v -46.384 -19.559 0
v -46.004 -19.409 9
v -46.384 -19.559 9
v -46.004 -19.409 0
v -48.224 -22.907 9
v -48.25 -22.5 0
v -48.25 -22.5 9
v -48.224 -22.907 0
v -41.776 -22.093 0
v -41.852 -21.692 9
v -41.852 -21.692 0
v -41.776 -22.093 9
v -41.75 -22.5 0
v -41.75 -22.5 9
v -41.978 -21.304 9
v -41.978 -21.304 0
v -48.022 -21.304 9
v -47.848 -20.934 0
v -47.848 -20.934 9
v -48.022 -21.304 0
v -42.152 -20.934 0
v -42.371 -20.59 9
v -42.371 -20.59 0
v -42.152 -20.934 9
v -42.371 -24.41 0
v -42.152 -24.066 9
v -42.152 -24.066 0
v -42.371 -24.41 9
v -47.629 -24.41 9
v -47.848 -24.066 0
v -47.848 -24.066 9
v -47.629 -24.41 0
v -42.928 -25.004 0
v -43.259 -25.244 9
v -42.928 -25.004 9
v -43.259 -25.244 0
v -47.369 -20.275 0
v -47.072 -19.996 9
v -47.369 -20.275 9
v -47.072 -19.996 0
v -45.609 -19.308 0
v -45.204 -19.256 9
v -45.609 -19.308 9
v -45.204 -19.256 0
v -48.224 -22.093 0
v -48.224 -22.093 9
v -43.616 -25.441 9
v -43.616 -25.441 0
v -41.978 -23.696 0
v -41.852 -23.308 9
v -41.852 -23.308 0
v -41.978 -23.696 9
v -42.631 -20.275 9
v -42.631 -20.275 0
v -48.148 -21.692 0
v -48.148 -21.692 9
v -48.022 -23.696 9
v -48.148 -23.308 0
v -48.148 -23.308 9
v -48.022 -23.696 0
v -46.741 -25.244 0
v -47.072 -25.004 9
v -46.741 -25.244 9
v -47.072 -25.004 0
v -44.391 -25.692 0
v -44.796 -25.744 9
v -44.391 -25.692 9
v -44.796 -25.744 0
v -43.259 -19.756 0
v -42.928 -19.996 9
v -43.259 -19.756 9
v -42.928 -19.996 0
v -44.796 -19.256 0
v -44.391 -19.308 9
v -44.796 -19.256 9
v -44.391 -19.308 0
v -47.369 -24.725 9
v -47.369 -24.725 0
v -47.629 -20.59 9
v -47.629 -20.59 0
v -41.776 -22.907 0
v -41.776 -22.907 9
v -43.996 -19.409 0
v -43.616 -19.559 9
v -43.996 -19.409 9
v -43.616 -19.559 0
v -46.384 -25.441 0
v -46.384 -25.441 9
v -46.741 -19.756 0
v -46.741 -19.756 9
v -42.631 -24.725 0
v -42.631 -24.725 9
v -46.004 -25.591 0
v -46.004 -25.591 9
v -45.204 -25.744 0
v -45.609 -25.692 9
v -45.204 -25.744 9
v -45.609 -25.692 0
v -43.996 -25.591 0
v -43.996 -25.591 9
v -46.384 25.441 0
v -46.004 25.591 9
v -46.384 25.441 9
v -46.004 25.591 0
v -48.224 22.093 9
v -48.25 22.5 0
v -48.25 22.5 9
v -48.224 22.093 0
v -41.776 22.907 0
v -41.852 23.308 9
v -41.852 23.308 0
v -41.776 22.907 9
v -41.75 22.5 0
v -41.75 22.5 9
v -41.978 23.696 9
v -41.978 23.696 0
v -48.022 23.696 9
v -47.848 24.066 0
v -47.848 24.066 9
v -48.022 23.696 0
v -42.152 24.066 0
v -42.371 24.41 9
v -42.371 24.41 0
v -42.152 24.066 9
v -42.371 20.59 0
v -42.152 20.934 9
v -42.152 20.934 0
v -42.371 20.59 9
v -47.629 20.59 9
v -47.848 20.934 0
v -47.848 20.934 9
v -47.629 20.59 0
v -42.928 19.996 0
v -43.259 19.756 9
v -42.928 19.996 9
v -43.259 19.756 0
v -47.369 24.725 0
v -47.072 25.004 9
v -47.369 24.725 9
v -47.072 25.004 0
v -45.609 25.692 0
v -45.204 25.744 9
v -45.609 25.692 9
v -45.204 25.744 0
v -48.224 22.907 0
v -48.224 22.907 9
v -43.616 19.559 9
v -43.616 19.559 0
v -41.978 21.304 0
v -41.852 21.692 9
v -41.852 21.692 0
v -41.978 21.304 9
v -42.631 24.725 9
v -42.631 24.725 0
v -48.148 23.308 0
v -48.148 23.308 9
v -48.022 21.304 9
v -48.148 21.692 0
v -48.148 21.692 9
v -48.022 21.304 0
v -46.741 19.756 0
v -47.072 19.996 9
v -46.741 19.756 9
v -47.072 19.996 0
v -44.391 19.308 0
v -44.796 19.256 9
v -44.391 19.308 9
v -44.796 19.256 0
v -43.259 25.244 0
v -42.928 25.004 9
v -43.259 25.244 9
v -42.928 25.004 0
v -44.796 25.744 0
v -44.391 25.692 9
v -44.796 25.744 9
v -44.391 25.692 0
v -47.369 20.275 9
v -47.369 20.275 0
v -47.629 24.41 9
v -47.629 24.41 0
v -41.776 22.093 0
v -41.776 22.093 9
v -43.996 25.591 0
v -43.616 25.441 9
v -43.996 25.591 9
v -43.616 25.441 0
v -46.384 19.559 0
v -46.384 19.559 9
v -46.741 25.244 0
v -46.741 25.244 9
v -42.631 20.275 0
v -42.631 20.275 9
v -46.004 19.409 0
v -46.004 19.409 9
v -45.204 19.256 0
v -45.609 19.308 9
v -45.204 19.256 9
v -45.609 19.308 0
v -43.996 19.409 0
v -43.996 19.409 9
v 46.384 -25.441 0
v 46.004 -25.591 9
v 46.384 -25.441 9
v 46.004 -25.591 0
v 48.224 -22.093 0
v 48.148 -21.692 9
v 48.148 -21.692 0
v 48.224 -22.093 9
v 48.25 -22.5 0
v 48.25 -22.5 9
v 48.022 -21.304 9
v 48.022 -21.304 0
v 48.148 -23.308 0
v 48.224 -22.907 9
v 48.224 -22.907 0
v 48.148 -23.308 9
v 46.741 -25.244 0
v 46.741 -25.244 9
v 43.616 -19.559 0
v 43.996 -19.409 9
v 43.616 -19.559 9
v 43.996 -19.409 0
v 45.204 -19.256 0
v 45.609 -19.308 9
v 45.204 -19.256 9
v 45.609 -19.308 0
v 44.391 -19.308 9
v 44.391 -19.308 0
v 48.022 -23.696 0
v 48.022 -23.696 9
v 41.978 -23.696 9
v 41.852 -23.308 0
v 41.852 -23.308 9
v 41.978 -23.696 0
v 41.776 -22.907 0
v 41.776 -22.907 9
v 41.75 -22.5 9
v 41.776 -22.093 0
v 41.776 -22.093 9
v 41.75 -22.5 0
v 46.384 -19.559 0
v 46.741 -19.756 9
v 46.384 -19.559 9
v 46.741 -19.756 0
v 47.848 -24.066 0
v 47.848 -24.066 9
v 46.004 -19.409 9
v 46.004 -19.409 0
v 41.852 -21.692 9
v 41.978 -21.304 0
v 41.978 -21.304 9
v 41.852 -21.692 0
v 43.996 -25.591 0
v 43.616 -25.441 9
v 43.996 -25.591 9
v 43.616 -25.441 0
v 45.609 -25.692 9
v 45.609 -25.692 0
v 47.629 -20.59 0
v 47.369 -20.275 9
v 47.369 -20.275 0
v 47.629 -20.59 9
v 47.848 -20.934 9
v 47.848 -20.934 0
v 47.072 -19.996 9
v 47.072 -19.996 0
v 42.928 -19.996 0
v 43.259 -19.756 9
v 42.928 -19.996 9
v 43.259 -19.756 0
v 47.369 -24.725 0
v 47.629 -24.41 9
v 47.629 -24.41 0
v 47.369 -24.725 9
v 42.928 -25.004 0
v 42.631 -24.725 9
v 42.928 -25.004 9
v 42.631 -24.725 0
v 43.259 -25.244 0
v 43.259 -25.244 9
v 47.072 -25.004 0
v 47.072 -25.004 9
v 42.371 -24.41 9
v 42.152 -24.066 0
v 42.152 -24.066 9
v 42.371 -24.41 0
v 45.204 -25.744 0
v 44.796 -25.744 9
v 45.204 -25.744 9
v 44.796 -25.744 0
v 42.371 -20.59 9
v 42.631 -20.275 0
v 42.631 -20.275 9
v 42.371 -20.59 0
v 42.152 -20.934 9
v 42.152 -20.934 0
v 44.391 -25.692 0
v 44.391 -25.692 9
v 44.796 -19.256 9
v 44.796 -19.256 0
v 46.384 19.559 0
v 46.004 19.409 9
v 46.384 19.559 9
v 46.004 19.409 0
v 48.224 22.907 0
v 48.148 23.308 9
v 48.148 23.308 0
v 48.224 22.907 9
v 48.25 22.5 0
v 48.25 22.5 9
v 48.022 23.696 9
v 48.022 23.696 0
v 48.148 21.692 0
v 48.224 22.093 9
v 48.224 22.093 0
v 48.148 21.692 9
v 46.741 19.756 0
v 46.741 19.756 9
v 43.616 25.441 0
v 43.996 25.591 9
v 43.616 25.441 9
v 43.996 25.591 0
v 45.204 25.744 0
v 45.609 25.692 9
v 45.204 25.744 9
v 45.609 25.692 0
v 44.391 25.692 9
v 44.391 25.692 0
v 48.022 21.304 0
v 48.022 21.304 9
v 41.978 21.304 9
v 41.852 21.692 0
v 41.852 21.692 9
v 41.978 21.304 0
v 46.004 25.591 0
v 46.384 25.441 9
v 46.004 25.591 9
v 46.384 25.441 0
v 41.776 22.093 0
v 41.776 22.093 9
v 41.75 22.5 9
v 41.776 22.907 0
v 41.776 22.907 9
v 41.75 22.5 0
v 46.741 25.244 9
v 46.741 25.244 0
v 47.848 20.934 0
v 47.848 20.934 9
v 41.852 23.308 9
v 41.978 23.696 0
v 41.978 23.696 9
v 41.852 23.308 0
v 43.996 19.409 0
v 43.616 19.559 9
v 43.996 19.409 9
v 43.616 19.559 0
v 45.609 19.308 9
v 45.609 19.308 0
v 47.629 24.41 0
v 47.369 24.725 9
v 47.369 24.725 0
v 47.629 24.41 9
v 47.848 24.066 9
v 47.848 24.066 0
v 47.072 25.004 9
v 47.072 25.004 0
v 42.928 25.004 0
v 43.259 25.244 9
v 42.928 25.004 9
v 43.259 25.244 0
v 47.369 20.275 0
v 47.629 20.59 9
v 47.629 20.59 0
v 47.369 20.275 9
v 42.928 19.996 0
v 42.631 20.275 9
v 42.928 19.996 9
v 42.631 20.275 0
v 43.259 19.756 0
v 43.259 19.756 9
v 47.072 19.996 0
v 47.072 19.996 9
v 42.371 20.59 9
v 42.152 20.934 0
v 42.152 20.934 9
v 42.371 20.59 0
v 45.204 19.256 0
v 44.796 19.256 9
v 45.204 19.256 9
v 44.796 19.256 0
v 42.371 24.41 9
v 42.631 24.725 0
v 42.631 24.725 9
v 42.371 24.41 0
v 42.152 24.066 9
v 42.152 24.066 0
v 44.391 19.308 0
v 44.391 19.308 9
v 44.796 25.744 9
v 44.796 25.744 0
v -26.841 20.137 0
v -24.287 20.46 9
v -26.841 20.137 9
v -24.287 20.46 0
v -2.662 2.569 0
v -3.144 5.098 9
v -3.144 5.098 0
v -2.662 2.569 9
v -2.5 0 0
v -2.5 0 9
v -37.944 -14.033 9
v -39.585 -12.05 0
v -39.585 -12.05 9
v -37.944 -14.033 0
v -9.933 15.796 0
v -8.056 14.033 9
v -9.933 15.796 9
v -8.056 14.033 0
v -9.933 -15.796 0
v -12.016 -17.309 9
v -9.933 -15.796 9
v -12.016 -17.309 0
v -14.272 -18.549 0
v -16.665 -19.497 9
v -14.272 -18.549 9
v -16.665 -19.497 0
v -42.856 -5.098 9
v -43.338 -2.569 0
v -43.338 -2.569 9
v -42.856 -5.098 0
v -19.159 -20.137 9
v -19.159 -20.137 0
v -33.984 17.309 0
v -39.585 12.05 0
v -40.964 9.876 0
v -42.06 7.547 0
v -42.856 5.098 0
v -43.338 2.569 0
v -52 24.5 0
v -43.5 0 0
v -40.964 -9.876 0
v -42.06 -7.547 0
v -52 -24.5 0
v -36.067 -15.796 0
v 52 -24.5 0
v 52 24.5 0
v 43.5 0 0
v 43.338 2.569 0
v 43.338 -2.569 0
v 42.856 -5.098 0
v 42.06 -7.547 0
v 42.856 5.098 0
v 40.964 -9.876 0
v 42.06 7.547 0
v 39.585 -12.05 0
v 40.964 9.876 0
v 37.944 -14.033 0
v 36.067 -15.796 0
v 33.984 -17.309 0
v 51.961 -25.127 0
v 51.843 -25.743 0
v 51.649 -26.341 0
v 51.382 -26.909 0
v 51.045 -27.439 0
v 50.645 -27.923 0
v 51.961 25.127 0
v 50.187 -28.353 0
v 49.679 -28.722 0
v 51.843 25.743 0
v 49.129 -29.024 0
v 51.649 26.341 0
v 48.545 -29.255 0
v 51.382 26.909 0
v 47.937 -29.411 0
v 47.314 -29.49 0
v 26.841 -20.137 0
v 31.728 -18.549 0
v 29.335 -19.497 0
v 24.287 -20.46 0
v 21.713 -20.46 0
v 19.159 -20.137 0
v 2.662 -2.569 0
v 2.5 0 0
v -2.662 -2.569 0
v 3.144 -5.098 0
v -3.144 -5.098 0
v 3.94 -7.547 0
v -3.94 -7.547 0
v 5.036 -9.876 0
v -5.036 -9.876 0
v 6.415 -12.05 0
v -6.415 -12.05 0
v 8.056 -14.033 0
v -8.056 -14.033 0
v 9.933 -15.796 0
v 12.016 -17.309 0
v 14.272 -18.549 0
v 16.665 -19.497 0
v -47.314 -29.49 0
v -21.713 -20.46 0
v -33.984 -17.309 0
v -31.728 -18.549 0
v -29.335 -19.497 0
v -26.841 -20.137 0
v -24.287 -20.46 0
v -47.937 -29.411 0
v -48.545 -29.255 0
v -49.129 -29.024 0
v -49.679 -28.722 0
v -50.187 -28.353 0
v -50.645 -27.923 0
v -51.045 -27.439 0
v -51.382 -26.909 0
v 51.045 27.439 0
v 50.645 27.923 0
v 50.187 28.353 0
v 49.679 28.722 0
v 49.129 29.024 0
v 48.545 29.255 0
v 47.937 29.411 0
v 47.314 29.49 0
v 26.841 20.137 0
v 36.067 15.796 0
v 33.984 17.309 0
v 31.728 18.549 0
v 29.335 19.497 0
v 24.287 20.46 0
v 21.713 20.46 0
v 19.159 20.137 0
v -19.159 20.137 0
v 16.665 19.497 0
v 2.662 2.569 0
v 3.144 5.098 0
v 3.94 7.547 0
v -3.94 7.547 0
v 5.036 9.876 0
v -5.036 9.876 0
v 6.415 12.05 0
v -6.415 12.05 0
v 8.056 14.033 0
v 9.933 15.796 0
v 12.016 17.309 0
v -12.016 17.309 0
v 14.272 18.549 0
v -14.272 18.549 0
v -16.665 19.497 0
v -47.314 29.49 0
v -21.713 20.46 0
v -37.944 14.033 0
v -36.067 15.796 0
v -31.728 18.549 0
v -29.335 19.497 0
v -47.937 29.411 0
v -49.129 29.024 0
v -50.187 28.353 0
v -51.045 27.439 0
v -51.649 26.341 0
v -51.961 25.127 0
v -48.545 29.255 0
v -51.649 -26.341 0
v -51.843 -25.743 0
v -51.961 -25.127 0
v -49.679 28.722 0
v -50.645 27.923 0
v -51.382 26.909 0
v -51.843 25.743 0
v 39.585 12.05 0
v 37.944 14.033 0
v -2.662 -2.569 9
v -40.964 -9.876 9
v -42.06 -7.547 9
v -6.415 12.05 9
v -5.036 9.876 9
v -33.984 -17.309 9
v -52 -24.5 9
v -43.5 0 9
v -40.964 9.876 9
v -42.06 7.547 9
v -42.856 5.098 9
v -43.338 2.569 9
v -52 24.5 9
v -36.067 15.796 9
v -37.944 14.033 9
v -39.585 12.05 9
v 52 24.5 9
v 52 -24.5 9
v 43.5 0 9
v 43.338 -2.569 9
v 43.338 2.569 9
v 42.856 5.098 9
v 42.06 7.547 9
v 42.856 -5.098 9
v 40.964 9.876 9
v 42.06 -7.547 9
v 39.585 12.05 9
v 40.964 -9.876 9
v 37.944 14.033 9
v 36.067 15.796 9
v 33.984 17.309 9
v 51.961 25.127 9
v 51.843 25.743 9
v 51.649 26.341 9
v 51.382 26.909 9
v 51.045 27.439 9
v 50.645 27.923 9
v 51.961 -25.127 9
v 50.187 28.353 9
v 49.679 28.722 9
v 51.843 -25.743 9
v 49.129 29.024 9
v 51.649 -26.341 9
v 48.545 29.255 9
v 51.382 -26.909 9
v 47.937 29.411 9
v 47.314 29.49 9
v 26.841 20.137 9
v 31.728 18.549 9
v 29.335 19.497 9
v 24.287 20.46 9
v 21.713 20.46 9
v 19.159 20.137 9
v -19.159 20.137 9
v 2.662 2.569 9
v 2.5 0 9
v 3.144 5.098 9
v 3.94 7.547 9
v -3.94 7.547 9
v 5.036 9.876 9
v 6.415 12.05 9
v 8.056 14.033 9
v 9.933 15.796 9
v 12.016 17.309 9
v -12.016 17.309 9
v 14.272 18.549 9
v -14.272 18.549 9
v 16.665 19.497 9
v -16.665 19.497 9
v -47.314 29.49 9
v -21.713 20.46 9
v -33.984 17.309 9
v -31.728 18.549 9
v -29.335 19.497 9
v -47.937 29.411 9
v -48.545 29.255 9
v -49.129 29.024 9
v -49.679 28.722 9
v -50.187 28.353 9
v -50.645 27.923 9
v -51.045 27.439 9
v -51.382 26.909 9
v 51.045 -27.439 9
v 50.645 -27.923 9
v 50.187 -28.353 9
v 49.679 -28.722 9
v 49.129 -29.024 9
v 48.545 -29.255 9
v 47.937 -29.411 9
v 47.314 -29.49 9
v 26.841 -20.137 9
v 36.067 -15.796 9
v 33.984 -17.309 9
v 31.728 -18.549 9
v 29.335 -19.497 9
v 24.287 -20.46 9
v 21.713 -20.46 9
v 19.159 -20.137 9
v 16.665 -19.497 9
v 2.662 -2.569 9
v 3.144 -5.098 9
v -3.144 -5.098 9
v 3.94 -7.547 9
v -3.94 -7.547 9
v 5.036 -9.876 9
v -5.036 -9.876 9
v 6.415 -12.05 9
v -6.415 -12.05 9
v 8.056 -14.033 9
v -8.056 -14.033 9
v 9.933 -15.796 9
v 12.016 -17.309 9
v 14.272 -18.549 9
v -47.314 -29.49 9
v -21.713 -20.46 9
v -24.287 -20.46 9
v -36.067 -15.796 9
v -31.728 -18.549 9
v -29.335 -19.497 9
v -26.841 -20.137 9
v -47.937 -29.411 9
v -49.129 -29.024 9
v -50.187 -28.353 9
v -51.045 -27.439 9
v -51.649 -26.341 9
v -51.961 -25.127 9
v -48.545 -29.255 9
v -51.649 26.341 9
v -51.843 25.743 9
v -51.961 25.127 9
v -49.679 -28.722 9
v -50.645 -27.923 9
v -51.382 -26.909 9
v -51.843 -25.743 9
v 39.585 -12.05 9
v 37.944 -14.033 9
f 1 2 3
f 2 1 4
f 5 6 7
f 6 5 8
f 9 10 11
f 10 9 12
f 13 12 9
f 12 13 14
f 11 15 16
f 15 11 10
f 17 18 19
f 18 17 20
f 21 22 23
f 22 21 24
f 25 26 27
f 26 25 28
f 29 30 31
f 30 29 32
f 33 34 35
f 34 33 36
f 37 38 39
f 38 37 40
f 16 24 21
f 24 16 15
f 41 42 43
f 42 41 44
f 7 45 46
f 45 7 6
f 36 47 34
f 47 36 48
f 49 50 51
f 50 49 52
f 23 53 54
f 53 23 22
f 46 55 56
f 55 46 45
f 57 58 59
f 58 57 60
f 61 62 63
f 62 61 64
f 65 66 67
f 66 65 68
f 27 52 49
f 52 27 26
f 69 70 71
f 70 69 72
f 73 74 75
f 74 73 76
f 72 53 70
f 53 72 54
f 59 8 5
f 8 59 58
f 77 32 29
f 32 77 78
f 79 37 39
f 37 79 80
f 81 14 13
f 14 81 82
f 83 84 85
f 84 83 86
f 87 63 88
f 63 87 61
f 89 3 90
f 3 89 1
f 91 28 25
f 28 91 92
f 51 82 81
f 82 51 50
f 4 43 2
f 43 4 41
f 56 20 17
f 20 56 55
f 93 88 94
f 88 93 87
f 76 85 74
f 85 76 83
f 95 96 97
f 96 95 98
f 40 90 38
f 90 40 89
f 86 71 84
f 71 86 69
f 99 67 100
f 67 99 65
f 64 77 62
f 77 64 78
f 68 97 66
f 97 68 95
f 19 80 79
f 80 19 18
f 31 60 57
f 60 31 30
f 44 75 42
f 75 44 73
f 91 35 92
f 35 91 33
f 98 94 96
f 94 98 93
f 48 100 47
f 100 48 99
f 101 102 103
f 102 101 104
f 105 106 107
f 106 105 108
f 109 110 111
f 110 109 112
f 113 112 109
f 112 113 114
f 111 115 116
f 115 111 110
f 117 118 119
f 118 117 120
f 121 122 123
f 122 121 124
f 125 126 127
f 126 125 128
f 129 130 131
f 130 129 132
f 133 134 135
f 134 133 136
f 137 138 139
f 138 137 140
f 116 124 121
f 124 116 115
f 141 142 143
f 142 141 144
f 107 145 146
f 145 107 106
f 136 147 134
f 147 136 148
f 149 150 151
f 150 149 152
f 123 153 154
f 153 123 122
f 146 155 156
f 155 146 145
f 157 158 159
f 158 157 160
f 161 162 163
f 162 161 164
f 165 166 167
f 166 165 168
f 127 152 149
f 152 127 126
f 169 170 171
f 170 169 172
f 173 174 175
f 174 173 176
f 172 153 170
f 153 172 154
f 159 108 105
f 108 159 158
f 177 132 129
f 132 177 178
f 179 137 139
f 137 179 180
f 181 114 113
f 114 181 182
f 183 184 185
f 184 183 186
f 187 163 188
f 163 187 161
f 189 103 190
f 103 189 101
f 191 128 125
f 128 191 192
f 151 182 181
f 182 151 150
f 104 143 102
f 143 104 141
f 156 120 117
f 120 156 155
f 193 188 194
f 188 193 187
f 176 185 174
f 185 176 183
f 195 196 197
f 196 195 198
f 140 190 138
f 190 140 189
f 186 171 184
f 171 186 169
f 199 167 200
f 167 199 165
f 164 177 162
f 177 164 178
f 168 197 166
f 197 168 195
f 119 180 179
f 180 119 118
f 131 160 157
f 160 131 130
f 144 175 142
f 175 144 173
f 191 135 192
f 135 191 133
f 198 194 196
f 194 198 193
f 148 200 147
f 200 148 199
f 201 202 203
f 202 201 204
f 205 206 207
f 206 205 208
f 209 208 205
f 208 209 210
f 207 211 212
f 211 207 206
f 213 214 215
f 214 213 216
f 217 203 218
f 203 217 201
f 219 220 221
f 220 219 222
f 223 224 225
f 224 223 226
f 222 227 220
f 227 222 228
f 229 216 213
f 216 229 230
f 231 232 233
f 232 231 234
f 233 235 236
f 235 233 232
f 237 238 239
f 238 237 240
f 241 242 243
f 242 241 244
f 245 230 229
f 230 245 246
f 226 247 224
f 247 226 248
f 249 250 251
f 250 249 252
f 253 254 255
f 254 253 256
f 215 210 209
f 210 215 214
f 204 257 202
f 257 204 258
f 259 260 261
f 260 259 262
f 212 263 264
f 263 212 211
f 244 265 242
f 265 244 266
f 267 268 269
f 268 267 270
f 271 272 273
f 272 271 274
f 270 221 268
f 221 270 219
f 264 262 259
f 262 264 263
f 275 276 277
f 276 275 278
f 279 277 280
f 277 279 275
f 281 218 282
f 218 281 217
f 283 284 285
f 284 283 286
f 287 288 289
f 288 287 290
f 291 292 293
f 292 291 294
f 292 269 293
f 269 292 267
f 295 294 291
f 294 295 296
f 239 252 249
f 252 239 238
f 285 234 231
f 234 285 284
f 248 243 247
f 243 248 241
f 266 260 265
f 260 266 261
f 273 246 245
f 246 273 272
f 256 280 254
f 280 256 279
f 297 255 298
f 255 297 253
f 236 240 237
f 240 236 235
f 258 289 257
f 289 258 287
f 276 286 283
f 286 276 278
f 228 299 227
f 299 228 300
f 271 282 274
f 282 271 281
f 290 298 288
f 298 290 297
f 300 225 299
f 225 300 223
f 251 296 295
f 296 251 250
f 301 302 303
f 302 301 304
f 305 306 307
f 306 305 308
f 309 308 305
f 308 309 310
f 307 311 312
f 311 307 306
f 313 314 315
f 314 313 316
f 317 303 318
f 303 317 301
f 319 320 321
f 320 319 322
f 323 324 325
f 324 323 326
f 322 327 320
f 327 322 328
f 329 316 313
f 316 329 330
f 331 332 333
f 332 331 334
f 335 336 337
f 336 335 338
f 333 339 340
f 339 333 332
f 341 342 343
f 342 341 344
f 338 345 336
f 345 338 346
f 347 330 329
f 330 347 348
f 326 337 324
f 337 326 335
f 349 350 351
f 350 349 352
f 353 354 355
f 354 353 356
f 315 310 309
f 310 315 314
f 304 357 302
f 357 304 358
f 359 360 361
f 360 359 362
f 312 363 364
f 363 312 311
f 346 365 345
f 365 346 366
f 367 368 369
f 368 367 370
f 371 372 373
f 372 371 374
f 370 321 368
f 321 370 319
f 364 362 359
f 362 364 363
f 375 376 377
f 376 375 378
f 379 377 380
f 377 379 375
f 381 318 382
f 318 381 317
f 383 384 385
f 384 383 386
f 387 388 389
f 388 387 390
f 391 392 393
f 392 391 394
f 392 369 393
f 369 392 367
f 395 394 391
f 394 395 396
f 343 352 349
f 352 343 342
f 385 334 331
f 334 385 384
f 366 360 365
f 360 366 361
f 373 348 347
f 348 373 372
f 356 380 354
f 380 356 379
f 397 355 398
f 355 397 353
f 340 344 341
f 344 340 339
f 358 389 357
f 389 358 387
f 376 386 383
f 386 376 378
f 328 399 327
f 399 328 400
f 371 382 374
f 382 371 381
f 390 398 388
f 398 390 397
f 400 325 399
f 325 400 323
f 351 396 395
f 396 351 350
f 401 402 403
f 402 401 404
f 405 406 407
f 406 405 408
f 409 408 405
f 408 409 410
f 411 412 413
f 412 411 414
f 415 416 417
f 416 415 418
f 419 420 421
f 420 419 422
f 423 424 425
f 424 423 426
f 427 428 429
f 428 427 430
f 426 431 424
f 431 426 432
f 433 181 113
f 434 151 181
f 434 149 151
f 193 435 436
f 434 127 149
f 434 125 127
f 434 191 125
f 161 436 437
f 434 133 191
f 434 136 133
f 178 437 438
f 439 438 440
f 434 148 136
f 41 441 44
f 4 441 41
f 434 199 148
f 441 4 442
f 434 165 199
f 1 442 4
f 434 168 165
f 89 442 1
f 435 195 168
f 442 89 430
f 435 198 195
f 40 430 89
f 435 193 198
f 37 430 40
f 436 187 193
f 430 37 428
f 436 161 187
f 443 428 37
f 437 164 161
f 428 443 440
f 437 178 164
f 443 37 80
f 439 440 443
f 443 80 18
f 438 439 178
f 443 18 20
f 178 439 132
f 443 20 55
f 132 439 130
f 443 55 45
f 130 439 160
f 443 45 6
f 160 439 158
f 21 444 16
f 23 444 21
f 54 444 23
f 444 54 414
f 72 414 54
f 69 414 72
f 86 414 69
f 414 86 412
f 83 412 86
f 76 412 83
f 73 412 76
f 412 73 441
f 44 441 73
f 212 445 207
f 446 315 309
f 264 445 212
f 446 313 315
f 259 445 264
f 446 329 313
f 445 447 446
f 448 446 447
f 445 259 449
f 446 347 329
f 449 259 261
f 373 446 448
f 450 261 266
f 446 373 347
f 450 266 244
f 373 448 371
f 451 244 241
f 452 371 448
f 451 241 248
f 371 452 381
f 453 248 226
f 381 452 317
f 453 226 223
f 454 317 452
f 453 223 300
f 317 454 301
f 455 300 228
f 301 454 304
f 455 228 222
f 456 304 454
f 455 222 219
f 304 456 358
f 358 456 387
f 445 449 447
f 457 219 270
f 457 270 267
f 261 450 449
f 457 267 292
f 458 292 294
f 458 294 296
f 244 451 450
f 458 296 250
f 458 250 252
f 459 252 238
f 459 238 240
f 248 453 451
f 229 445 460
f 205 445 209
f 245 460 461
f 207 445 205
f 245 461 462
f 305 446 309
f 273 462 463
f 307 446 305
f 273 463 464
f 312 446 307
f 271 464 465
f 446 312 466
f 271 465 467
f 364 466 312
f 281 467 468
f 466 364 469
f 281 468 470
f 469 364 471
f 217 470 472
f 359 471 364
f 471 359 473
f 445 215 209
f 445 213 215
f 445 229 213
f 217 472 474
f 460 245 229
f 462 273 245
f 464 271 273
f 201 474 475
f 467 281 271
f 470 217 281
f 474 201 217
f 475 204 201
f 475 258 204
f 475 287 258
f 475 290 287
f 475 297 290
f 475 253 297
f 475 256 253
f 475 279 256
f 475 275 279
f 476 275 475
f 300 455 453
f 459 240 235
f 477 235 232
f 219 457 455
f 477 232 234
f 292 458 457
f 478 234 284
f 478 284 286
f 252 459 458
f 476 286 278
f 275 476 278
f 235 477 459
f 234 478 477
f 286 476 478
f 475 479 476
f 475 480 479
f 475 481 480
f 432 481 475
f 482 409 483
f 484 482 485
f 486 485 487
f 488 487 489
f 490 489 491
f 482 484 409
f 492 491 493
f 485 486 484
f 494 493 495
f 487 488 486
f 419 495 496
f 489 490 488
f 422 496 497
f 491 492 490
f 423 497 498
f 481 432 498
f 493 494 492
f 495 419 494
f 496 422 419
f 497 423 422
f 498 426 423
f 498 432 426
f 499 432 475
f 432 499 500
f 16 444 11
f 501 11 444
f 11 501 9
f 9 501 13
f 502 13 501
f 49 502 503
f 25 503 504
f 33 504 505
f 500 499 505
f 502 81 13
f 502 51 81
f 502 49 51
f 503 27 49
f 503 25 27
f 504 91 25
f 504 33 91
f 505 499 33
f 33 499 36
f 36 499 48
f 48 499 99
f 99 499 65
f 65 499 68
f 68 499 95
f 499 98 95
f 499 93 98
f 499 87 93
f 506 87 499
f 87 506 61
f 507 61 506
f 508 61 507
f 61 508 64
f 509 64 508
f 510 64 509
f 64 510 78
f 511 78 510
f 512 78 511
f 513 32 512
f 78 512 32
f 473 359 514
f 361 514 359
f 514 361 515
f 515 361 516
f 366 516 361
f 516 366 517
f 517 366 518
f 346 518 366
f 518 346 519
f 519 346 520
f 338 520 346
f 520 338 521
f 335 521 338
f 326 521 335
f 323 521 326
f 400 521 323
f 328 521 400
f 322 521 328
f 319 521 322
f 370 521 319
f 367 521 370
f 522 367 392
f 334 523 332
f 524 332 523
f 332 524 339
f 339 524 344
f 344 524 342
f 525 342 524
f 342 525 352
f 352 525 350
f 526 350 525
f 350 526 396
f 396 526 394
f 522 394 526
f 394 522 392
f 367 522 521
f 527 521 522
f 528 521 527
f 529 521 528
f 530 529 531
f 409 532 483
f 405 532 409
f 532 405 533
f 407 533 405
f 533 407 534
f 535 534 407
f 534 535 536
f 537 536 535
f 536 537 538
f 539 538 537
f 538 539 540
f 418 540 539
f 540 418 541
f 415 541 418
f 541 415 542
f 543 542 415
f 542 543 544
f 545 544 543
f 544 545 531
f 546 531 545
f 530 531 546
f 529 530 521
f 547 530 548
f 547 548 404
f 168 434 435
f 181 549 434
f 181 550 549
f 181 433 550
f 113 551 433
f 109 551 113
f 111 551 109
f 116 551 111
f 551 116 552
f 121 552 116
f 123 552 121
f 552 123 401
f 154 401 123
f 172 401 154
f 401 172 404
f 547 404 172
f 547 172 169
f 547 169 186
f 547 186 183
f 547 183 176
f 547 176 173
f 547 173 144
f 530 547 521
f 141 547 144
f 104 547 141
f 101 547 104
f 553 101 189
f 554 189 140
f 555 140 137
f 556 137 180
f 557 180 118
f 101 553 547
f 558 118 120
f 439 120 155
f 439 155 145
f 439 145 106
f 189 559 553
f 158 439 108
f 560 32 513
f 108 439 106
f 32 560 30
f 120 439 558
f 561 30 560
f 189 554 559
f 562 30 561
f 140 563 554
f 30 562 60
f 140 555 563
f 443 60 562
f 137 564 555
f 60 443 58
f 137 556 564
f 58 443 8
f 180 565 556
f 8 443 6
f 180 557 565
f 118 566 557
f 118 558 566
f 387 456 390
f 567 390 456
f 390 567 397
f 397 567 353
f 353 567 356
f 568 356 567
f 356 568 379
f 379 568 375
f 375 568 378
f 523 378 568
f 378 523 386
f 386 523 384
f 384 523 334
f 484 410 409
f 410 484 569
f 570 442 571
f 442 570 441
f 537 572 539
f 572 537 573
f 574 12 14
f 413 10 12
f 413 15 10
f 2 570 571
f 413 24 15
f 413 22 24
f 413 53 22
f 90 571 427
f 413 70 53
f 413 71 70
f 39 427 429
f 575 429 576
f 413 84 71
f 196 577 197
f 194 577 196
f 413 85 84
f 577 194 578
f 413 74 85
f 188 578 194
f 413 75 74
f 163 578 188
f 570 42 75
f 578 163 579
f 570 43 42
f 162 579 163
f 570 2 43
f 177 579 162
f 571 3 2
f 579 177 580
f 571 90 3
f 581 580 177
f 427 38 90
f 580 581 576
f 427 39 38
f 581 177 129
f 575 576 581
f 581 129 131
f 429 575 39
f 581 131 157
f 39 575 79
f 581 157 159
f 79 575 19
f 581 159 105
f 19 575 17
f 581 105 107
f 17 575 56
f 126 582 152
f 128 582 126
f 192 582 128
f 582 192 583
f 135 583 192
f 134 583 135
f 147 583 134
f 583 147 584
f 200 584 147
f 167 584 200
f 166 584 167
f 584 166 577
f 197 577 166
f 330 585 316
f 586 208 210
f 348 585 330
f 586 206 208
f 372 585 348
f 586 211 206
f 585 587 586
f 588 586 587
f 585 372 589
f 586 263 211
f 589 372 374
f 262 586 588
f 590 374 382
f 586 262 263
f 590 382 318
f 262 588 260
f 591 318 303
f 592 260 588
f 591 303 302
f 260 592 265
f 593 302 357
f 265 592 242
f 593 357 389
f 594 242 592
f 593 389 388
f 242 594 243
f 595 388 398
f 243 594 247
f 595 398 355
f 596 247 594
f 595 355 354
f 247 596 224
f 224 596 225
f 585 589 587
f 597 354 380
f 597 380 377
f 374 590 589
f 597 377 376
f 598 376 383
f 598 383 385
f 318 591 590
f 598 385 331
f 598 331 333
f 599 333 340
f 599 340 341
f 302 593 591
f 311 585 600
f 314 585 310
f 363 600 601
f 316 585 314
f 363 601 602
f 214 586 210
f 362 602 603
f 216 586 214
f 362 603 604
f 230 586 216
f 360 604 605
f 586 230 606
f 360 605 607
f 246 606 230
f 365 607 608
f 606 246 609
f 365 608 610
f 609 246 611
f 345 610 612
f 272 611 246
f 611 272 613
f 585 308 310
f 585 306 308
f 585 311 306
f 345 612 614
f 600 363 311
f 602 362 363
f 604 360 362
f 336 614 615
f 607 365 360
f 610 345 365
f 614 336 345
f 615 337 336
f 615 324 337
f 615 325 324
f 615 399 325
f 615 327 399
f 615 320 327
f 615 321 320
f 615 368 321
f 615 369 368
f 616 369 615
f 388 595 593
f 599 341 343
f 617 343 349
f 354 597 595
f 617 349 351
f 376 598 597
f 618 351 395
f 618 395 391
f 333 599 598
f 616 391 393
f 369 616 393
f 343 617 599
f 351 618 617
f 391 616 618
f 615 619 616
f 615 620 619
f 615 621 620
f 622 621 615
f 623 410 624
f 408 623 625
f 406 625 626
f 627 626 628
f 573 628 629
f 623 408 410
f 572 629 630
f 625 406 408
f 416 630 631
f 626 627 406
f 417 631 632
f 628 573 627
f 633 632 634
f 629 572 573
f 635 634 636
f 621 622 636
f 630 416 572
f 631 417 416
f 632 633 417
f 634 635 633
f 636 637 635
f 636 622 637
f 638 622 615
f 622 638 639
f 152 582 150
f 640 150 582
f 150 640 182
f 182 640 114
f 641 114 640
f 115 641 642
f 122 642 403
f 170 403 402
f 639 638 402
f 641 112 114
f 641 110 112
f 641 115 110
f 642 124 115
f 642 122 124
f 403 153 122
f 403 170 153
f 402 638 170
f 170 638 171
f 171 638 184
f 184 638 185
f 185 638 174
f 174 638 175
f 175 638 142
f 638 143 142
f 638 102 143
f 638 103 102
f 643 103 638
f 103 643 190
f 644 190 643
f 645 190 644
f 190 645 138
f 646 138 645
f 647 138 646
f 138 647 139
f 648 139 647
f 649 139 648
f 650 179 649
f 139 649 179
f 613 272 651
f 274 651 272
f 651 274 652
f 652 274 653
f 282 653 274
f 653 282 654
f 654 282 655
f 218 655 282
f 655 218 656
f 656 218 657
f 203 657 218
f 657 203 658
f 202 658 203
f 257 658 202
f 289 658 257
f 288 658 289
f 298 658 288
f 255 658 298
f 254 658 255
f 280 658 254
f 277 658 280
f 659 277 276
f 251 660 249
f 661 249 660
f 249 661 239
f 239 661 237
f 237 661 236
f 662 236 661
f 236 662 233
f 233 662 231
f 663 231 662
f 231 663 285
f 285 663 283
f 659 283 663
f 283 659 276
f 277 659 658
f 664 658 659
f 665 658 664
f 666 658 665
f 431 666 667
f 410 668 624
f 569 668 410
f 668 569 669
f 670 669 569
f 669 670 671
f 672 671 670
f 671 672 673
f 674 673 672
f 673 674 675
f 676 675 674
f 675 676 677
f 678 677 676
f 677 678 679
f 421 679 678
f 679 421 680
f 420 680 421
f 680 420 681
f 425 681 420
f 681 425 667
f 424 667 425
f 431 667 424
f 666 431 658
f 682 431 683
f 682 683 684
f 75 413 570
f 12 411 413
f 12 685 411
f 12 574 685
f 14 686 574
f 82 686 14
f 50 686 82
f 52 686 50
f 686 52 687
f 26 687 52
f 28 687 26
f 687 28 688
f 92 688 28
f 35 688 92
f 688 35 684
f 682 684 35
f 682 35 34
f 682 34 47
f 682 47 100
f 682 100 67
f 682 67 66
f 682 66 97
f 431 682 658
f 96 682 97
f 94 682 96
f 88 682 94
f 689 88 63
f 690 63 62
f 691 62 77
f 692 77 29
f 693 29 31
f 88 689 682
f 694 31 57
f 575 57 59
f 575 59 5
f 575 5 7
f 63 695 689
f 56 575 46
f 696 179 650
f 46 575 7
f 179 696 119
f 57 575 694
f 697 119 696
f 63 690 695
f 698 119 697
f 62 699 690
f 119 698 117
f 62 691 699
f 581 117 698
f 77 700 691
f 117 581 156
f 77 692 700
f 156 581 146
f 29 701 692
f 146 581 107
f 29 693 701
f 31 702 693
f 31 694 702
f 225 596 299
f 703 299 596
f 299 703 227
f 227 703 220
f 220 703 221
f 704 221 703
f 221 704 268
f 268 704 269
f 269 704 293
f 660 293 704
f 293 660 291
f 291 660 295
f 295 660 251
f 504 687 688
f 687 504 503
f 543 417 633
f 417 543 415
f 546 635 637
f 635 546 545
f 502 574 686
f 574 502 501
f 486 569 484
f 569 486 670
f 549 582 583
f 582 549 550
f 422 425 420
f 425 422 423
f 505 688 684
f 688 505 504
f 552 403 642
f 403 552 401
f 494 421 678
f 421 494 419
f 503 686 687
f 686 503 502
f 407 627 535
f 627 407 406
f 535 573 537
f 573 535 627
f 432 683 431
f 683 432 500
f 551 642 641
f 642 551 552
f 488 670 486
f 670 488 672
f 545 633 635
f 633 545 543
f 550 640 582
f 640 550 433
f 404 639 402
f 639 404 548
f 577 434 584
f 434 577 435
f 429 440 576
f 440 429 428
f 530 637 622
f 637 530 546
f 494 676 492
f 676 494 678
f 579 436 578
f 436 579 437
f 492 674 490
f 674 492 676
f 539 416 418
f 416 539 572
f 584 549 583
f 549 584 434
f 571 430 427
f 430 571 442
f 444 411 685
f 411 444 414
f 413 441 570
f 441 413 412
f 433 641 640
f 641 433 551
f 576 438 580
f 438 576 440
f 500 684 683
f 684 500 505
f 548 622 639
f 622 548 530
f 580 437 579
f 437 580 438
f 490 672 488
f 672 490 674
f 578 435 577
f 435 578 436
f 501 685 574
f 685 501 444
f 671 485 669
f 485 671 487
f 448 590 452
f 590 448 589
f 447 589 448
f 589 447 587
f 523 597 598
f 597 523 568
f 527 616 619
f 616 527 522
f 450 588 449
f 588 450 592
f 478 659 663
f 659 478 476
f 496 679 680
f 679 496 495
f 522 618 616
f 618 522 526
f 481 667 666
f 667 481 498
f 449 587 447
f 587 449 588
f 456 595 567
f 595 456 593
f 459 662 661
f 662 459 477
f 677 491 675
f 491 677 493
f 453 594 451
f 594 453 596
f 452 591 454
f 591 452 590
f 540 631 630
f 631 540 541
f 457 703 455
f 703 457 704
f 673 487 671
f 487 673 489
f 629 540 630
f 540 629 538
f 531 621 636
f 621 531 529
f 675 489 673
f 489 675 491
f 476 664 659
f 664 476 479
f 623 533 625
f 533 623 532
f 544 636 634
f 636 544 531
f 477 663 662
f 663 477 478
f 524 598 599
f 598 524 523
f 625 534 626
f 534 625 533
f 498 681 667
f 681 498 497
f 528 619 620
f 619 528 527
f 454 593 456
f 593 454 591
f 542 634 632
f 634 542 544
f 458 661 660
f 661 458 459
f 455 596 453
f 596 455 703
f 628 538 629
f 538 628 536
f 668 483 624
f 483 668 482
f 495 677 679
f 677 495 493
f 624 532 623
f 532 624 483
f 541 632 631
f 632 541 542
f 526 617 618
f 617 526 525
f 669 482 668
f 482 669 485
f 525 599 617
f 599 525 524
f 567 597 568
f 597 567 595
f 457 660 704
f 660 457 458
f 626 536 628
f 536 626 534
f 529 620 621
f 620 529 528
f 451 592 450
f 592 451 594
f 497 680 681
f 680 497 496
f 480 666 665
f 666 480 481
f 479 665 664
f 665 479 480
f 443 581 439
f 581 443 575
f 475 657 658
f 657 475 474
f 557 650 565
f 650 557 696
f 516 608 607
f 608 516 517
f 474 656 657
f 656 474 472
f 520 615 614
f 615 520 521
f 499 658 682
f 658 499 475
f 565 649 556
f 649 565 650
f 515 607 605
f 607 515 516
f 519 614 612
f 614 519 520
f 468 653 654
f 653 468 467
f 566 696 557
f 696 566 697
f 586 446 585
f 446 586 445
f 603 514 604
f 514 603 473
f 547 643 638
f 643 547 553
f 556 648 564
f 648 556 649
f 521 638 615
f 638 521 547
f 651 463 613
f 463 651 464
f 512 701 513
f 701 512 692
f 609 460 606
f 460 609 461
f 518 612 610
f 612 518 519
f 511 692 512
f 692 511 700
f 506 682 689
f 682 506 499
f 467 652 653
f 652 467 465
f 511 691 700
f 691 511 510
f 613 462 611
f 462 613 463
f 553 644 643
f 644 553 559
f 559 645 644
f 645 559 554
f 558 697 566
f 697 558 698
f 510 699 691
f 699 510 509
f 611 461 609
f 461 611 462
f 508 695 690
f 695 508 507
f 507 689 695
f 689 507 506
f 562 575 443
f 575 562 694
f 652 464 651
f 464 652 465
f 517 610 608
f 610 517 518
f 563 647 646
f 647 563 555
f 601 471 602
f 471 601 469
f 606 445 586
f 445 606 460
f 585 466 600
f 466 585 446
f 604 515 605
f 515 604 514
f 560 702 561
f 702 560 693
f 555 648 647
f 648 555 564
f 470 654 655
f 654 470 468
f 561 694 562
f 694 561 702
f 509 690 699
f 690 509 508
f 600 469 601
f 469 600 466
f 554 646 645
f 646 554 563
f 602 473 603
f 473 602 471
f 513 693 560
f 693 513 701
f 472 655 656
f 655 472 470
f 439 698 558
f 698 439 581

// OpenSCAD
$fn = 50;


difference() {
	union() {
		hull() {
			translate(v = [-47.0000000000, 24.5000000000, 0]) {
				cylinder(h = 9, r = 5);
			}
			translate(v = [47.0000000000, 24.5000000000, 0]) {
				cylinder(h = 9, r = 5);
			}
			translate(v = [-47.0000000000, -24.5000000000, 0]) {
				cylinder(h = 9, r = 5);
			}
			translate(v = [47.0000000000, -24.5000000000, 0]) {
				cylinder(h = 9, r = 5);
			}
		}
	}
	union() {
		#translate(v = [-45.0000000000, -22.5000000000, -100.0000000000]) {
			cylinder(h = 200, r = 3.2500000000);
		}
		#translate(v = [-45.0000000000, 22.5000000000, -100.0000000000]) {
			cylinder(h = 200, r = 3.2500000000);
		}
		#translate(v = [45.0000000000, -22.5000000000, -100.0000000000]) {
			cylinder(h = 200, r = 3.2500000000);
		}
		#translate(v = [45.0000000000, 22.5000000000, -100.0000000000]) {
			cylinder(h = 200, r = 3.2500000000);
		}
		#translate(v = [-23.0000000000, 0, 0]) {
			cylinder(h = 9, r = 20.5000000000);
		}
		#translate(v = [23.0000000000, 0, 0]) {
			cylinder(h = 9, r = 20.5000000000);
		}
	}
}
